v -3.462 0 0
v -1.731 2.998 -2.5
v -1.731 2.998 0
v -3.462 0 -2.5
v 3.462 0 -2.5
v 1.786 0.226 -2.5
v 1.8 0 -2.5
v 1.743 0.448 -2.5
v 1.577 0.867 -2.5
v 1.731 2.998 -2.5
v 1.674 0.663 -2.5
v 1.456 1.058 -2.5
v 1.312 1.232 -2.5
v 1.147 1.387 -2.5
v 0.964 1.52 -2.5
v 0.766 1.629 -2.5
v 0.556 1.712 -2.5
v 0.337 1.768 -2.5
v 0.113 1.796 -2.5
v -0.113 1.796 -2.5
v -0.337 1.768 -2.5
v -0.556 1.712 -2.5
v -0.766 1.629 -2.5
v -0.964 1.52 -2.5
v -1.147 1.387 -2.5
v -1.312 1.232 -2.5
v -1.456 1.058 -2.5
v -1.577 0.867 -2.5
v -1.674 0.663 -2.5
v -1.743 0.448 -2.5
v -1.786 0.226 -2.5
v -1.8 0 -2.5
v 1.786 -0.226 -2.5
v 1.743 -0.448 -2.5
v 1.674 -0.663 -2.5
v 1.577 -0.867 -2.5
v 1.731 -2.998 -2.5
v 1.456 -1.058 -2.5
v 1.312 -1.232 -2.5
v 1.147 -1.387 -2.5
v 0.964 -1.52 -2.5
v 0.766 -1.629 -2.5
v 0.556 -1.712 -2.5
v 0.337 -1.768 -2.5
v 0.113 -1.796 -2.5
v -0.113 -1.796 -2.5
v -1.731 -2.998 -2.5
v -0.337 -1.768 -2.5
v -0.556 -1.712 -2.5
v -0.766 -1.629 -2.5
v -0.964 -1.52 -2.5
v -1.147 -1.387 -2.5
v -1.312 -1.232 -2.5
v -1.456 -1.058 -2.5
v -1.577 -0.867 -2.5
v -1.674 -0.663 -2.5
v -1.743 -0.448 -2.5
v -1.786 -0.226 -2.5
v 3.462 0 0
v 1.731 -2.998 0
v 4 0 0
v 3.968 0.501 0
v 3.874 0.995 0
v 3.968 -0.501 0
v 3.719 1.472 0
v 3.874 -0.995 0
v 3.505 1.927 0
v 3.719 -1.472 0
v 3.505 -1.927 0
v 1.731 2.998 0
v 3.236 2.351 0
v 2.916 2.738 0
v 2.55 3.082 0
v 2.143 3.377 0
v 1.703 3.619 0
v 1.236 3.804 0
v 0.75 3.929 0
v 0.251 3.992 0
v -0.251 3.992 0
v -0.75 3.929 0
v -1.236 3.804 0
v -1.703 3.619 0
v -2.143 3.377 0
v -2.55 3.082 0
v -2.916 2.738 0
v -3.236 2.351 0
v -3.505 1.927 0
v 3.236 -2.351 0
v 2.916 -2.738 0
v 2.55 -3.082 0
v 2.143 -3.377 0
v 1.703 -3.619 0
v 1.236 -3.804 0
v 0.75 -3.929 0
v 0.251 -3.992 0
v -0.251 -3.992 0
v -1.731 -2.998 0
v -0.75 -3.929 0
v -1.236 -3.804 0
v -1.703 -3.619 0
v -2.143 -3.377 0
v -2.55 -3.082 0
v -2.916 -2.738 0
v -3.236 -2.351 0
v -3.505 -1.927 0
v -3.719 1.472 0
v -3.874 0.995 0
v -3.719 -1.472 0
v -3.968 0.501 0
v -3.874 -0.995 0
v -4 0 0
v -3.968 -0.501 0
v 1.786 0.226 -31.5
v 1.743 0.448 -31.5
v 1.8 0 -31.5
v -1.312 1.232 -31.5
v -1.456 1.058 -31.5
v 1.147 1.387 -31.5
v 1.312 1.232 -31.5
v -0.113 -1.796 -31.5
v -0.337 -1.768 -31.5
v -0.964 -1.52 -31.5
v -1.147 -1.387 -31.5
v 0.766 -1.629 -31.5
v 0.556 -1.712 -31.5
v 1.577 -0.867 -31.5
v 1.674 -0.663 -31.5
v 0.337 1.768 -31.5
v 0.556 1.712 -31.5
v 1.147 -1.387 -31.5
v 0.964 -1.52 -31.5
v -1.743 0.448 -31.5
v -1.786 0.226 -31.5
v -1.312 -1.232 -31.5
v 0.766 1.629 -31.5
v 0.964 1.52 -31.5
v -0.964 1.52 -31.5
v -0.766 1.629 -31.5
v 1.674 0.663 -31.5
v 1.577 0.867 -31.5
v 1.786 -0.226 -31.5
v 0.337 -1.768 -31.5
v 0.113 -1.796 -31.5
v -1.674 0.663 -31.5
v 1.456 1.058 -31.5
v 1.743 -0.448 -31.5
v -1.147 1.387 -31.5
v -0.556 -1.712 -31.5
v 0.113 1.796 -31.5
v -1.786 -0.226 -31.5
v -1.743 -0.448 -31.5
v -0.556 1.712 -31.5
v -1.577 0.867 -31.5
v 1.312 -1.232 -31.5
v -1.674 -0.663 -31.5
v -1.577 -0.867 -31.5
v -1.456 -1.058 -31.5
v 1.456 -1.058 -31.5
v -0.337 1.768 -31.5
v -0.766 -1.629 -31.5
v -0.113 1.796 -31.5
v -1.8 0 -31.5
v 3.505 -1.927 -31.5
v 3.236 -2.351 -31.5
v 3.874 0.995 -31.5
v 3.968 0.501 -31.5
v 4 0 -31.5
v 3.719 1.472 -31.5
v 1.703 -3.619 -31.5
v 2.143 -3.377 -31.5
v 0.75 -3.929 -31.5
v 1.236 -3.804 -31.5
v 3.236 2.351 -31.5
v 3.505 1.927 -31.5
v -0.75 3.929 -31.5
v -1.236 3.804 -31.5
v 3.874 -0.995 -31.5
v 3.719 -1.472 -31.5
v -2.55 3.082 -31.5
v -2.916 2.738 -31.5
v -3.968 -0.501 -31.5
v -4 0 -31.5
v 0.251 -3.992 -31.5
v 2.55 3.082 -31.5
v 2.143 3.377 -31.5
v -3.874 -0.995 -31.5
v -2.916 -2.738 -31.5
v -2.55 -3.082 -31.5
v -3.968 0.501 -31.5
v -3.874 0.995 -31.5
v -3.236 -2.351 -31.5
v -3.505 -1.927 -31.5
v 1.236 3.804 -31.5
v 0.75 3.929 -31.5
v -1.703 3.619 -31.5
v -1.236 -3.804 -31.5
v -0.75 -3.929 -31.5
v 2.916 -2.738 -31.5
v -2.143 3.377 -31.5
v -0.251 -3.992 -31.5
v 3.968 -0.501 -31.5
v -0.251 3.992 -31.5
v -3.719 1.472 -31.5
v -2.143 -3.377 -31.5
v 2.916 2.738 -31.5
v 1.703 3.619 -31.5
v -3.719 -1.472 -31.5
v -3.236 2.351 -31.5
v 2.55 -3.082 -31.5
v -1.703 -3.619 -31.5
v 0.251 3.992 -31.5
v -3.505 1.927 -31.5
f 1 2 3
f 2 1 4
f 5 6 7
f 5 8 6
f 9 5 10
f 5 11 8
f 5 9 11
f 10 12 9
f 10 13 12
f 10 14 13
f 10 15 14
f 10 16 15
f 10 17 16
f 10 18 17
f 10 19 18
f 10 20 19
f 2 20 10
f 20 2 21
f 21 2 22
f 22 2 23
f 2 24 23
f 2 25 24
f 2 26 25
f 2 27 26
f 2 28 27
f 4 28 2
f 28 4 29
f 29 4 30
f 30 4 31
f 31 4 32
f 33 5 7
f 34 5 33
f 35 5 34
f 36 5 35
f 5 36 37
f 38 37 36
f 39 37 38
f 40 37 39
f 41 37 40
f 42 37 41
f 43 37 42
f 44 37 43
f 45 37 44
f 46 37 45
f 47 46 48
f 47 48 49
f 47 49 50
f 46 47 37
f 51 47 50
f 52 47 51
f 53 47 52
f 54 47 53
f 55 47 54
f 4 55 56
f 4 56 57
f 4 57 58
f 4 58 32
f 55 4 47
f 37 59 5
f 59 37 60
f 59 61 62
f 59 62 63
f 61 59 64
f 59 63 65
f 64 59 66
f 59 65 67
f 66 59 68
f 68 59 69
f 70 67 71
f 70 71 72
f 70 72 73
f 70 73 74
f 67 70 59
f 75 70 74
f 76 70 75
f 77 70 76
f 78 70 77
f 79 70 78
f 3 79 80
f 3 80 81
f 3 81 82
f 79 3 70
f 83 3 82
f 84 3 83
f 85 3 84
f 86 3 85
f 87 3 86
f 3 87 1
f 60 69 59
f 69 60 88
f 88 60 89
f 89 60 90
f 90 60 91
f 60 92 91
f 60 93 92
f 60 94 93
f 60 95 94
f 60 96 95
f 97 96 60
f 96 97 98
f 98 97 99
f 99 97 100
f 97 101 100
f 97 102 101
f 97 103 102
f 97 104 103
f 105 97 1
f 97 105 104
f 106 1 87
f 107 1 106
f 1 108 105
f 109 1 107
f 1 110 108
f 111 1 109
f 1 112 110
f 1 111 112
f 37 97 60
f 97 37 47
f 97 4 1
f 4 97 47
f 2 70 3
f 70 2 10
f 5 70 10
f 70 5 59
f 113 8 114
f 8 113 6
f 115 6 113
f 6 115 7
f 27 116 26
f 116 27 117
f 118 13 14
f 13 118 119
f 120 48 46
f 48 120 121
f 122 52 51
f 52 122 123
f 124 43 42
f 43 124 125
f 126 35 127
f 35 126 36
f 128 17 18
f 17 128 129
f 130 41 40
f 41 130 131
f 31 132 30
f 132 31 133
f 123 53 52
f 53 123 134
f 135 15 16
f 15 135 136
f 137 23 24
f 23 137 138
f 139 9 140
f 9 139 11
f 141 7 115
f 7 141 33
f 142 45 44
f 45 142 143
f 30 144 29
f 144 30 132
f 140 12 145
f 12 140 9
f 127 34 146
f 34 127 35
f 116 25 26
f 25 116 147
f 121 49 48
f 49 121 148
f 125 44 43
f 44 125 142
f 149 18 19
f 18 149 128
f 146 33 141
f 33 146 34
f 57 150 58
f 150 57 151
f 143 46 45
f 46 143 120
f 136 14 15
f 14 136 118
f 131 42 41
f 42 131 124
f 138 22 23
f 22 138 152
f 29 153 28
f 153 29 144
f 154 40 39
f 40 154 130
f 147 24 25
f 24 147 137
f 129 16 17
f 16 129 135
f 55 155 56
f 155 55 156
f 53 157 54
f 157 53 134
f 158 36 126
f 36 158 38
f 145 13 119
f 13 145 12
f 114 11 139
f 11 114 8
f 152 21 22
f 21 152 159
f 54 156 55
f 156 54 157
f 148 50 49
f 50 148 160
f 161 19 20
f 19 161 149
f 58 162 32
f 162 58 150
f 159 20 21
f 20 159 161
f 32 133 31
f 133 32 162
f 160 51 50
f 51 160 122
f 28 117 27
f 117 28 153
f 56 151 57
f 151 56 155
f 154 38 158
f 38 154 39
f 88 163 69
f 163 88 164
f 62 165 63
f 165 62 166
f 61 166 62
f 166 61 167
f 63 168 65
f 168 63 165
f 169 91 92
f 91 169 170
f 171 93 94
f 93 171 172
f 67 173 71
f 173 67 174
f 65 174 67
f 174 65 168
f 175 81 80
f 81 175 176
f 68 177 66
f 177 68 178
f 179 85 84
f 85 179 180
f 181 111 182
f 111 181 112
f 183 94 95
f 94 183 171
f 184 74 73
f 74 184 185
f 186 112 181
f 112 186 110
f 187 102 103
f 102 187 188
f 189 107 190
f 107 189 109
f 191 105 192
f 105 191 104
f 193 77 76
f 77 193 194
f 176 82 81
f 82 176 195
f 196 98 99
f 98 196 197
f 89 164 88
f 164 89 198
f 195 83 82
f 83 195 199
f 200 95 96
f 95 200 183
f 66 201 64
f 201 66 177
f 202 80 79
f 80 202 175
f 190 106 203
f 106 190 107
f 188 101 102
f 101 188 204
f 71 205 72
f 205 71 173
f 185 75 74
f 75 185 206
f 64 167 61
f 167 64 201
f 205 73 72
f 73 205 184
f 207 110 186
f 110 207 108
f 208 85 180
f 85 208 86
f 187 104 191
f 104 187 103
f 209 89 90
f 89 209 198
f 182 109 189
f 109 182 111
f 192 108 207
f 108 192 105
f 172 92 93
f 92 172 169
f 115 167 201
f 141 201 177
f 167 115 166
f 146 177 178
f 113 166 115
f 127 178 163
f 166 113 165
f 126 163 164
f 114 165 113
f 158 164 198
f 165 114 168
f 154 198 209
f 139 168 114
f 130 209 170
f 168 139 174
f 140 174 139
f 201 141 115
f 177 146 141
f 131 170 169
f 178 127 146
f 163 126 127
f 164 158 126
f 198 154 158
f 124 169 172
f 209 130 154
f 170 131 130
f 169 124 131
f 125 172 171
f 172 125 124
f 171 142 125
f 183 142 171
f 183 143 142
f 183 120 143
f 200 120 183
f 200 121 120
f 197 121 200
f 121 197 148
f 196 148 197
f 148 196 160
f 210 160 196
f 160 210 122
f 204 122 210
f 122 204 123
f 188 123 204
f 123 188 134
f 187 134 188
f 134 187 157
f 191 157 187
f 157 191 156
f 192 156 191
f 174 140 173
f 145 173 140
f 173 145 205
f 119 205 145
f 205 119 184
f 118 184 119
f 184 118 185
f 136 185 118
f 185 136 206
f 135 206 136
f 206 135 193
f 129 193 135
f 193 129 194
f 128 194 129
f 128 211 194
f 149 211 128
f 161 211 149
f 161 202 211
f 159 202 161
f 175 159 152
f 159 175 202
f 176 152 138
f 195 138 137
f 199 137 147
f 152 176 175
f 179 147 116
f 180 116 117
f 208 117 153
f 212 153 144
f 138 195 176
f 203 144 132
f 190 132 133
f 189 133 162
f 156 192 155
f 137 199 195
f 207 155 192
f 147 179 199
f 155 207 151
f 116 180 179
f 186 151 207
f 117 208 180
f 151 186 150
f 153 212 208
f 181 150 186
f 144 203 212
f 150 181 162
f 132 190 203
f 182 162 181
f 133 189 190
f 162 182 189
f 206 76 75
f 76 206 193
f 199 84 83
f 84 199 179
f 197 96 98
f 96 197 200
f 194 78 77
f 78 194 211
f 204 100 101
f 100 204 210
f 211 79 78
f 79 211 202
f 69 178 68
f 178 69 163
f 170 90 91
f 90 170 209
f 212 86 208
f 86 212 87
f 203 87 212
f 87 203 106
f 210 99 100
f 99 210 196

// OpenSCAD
$fn = 50;

difference() {
	union() {
		translate(v = [0, 0, -31.5]) {
			cylinder(h = 31.5, r = 4.0);
		}
	}
	union() {
		translate(v = [0, 0, 0]) {
			rotate(a = [0, 0, 0]) {
				difference() {
					union() {
						translate(v = [0, 0, -2.5]) {
							linear_extrude(height = 2.5) {
								polygon(points = [[3.4619999999999997, 0.0], [1.7310000000000003, 2.9981799479017264], [-1.7309999999999992, 2.9981799479017264], [-3.4619999999999997, 4.2397272186481365e-16], [-1.7310000000000014, -2.998179947901726], [1.7309999999999977, -2.9981799479017277]]);
							}
						}
					}
					union();
				}
			}
		}
		#translate(v = [0, 0, -100.0]) {
			cylinder(h = 200, r = 1.8);
		}
	}
}
